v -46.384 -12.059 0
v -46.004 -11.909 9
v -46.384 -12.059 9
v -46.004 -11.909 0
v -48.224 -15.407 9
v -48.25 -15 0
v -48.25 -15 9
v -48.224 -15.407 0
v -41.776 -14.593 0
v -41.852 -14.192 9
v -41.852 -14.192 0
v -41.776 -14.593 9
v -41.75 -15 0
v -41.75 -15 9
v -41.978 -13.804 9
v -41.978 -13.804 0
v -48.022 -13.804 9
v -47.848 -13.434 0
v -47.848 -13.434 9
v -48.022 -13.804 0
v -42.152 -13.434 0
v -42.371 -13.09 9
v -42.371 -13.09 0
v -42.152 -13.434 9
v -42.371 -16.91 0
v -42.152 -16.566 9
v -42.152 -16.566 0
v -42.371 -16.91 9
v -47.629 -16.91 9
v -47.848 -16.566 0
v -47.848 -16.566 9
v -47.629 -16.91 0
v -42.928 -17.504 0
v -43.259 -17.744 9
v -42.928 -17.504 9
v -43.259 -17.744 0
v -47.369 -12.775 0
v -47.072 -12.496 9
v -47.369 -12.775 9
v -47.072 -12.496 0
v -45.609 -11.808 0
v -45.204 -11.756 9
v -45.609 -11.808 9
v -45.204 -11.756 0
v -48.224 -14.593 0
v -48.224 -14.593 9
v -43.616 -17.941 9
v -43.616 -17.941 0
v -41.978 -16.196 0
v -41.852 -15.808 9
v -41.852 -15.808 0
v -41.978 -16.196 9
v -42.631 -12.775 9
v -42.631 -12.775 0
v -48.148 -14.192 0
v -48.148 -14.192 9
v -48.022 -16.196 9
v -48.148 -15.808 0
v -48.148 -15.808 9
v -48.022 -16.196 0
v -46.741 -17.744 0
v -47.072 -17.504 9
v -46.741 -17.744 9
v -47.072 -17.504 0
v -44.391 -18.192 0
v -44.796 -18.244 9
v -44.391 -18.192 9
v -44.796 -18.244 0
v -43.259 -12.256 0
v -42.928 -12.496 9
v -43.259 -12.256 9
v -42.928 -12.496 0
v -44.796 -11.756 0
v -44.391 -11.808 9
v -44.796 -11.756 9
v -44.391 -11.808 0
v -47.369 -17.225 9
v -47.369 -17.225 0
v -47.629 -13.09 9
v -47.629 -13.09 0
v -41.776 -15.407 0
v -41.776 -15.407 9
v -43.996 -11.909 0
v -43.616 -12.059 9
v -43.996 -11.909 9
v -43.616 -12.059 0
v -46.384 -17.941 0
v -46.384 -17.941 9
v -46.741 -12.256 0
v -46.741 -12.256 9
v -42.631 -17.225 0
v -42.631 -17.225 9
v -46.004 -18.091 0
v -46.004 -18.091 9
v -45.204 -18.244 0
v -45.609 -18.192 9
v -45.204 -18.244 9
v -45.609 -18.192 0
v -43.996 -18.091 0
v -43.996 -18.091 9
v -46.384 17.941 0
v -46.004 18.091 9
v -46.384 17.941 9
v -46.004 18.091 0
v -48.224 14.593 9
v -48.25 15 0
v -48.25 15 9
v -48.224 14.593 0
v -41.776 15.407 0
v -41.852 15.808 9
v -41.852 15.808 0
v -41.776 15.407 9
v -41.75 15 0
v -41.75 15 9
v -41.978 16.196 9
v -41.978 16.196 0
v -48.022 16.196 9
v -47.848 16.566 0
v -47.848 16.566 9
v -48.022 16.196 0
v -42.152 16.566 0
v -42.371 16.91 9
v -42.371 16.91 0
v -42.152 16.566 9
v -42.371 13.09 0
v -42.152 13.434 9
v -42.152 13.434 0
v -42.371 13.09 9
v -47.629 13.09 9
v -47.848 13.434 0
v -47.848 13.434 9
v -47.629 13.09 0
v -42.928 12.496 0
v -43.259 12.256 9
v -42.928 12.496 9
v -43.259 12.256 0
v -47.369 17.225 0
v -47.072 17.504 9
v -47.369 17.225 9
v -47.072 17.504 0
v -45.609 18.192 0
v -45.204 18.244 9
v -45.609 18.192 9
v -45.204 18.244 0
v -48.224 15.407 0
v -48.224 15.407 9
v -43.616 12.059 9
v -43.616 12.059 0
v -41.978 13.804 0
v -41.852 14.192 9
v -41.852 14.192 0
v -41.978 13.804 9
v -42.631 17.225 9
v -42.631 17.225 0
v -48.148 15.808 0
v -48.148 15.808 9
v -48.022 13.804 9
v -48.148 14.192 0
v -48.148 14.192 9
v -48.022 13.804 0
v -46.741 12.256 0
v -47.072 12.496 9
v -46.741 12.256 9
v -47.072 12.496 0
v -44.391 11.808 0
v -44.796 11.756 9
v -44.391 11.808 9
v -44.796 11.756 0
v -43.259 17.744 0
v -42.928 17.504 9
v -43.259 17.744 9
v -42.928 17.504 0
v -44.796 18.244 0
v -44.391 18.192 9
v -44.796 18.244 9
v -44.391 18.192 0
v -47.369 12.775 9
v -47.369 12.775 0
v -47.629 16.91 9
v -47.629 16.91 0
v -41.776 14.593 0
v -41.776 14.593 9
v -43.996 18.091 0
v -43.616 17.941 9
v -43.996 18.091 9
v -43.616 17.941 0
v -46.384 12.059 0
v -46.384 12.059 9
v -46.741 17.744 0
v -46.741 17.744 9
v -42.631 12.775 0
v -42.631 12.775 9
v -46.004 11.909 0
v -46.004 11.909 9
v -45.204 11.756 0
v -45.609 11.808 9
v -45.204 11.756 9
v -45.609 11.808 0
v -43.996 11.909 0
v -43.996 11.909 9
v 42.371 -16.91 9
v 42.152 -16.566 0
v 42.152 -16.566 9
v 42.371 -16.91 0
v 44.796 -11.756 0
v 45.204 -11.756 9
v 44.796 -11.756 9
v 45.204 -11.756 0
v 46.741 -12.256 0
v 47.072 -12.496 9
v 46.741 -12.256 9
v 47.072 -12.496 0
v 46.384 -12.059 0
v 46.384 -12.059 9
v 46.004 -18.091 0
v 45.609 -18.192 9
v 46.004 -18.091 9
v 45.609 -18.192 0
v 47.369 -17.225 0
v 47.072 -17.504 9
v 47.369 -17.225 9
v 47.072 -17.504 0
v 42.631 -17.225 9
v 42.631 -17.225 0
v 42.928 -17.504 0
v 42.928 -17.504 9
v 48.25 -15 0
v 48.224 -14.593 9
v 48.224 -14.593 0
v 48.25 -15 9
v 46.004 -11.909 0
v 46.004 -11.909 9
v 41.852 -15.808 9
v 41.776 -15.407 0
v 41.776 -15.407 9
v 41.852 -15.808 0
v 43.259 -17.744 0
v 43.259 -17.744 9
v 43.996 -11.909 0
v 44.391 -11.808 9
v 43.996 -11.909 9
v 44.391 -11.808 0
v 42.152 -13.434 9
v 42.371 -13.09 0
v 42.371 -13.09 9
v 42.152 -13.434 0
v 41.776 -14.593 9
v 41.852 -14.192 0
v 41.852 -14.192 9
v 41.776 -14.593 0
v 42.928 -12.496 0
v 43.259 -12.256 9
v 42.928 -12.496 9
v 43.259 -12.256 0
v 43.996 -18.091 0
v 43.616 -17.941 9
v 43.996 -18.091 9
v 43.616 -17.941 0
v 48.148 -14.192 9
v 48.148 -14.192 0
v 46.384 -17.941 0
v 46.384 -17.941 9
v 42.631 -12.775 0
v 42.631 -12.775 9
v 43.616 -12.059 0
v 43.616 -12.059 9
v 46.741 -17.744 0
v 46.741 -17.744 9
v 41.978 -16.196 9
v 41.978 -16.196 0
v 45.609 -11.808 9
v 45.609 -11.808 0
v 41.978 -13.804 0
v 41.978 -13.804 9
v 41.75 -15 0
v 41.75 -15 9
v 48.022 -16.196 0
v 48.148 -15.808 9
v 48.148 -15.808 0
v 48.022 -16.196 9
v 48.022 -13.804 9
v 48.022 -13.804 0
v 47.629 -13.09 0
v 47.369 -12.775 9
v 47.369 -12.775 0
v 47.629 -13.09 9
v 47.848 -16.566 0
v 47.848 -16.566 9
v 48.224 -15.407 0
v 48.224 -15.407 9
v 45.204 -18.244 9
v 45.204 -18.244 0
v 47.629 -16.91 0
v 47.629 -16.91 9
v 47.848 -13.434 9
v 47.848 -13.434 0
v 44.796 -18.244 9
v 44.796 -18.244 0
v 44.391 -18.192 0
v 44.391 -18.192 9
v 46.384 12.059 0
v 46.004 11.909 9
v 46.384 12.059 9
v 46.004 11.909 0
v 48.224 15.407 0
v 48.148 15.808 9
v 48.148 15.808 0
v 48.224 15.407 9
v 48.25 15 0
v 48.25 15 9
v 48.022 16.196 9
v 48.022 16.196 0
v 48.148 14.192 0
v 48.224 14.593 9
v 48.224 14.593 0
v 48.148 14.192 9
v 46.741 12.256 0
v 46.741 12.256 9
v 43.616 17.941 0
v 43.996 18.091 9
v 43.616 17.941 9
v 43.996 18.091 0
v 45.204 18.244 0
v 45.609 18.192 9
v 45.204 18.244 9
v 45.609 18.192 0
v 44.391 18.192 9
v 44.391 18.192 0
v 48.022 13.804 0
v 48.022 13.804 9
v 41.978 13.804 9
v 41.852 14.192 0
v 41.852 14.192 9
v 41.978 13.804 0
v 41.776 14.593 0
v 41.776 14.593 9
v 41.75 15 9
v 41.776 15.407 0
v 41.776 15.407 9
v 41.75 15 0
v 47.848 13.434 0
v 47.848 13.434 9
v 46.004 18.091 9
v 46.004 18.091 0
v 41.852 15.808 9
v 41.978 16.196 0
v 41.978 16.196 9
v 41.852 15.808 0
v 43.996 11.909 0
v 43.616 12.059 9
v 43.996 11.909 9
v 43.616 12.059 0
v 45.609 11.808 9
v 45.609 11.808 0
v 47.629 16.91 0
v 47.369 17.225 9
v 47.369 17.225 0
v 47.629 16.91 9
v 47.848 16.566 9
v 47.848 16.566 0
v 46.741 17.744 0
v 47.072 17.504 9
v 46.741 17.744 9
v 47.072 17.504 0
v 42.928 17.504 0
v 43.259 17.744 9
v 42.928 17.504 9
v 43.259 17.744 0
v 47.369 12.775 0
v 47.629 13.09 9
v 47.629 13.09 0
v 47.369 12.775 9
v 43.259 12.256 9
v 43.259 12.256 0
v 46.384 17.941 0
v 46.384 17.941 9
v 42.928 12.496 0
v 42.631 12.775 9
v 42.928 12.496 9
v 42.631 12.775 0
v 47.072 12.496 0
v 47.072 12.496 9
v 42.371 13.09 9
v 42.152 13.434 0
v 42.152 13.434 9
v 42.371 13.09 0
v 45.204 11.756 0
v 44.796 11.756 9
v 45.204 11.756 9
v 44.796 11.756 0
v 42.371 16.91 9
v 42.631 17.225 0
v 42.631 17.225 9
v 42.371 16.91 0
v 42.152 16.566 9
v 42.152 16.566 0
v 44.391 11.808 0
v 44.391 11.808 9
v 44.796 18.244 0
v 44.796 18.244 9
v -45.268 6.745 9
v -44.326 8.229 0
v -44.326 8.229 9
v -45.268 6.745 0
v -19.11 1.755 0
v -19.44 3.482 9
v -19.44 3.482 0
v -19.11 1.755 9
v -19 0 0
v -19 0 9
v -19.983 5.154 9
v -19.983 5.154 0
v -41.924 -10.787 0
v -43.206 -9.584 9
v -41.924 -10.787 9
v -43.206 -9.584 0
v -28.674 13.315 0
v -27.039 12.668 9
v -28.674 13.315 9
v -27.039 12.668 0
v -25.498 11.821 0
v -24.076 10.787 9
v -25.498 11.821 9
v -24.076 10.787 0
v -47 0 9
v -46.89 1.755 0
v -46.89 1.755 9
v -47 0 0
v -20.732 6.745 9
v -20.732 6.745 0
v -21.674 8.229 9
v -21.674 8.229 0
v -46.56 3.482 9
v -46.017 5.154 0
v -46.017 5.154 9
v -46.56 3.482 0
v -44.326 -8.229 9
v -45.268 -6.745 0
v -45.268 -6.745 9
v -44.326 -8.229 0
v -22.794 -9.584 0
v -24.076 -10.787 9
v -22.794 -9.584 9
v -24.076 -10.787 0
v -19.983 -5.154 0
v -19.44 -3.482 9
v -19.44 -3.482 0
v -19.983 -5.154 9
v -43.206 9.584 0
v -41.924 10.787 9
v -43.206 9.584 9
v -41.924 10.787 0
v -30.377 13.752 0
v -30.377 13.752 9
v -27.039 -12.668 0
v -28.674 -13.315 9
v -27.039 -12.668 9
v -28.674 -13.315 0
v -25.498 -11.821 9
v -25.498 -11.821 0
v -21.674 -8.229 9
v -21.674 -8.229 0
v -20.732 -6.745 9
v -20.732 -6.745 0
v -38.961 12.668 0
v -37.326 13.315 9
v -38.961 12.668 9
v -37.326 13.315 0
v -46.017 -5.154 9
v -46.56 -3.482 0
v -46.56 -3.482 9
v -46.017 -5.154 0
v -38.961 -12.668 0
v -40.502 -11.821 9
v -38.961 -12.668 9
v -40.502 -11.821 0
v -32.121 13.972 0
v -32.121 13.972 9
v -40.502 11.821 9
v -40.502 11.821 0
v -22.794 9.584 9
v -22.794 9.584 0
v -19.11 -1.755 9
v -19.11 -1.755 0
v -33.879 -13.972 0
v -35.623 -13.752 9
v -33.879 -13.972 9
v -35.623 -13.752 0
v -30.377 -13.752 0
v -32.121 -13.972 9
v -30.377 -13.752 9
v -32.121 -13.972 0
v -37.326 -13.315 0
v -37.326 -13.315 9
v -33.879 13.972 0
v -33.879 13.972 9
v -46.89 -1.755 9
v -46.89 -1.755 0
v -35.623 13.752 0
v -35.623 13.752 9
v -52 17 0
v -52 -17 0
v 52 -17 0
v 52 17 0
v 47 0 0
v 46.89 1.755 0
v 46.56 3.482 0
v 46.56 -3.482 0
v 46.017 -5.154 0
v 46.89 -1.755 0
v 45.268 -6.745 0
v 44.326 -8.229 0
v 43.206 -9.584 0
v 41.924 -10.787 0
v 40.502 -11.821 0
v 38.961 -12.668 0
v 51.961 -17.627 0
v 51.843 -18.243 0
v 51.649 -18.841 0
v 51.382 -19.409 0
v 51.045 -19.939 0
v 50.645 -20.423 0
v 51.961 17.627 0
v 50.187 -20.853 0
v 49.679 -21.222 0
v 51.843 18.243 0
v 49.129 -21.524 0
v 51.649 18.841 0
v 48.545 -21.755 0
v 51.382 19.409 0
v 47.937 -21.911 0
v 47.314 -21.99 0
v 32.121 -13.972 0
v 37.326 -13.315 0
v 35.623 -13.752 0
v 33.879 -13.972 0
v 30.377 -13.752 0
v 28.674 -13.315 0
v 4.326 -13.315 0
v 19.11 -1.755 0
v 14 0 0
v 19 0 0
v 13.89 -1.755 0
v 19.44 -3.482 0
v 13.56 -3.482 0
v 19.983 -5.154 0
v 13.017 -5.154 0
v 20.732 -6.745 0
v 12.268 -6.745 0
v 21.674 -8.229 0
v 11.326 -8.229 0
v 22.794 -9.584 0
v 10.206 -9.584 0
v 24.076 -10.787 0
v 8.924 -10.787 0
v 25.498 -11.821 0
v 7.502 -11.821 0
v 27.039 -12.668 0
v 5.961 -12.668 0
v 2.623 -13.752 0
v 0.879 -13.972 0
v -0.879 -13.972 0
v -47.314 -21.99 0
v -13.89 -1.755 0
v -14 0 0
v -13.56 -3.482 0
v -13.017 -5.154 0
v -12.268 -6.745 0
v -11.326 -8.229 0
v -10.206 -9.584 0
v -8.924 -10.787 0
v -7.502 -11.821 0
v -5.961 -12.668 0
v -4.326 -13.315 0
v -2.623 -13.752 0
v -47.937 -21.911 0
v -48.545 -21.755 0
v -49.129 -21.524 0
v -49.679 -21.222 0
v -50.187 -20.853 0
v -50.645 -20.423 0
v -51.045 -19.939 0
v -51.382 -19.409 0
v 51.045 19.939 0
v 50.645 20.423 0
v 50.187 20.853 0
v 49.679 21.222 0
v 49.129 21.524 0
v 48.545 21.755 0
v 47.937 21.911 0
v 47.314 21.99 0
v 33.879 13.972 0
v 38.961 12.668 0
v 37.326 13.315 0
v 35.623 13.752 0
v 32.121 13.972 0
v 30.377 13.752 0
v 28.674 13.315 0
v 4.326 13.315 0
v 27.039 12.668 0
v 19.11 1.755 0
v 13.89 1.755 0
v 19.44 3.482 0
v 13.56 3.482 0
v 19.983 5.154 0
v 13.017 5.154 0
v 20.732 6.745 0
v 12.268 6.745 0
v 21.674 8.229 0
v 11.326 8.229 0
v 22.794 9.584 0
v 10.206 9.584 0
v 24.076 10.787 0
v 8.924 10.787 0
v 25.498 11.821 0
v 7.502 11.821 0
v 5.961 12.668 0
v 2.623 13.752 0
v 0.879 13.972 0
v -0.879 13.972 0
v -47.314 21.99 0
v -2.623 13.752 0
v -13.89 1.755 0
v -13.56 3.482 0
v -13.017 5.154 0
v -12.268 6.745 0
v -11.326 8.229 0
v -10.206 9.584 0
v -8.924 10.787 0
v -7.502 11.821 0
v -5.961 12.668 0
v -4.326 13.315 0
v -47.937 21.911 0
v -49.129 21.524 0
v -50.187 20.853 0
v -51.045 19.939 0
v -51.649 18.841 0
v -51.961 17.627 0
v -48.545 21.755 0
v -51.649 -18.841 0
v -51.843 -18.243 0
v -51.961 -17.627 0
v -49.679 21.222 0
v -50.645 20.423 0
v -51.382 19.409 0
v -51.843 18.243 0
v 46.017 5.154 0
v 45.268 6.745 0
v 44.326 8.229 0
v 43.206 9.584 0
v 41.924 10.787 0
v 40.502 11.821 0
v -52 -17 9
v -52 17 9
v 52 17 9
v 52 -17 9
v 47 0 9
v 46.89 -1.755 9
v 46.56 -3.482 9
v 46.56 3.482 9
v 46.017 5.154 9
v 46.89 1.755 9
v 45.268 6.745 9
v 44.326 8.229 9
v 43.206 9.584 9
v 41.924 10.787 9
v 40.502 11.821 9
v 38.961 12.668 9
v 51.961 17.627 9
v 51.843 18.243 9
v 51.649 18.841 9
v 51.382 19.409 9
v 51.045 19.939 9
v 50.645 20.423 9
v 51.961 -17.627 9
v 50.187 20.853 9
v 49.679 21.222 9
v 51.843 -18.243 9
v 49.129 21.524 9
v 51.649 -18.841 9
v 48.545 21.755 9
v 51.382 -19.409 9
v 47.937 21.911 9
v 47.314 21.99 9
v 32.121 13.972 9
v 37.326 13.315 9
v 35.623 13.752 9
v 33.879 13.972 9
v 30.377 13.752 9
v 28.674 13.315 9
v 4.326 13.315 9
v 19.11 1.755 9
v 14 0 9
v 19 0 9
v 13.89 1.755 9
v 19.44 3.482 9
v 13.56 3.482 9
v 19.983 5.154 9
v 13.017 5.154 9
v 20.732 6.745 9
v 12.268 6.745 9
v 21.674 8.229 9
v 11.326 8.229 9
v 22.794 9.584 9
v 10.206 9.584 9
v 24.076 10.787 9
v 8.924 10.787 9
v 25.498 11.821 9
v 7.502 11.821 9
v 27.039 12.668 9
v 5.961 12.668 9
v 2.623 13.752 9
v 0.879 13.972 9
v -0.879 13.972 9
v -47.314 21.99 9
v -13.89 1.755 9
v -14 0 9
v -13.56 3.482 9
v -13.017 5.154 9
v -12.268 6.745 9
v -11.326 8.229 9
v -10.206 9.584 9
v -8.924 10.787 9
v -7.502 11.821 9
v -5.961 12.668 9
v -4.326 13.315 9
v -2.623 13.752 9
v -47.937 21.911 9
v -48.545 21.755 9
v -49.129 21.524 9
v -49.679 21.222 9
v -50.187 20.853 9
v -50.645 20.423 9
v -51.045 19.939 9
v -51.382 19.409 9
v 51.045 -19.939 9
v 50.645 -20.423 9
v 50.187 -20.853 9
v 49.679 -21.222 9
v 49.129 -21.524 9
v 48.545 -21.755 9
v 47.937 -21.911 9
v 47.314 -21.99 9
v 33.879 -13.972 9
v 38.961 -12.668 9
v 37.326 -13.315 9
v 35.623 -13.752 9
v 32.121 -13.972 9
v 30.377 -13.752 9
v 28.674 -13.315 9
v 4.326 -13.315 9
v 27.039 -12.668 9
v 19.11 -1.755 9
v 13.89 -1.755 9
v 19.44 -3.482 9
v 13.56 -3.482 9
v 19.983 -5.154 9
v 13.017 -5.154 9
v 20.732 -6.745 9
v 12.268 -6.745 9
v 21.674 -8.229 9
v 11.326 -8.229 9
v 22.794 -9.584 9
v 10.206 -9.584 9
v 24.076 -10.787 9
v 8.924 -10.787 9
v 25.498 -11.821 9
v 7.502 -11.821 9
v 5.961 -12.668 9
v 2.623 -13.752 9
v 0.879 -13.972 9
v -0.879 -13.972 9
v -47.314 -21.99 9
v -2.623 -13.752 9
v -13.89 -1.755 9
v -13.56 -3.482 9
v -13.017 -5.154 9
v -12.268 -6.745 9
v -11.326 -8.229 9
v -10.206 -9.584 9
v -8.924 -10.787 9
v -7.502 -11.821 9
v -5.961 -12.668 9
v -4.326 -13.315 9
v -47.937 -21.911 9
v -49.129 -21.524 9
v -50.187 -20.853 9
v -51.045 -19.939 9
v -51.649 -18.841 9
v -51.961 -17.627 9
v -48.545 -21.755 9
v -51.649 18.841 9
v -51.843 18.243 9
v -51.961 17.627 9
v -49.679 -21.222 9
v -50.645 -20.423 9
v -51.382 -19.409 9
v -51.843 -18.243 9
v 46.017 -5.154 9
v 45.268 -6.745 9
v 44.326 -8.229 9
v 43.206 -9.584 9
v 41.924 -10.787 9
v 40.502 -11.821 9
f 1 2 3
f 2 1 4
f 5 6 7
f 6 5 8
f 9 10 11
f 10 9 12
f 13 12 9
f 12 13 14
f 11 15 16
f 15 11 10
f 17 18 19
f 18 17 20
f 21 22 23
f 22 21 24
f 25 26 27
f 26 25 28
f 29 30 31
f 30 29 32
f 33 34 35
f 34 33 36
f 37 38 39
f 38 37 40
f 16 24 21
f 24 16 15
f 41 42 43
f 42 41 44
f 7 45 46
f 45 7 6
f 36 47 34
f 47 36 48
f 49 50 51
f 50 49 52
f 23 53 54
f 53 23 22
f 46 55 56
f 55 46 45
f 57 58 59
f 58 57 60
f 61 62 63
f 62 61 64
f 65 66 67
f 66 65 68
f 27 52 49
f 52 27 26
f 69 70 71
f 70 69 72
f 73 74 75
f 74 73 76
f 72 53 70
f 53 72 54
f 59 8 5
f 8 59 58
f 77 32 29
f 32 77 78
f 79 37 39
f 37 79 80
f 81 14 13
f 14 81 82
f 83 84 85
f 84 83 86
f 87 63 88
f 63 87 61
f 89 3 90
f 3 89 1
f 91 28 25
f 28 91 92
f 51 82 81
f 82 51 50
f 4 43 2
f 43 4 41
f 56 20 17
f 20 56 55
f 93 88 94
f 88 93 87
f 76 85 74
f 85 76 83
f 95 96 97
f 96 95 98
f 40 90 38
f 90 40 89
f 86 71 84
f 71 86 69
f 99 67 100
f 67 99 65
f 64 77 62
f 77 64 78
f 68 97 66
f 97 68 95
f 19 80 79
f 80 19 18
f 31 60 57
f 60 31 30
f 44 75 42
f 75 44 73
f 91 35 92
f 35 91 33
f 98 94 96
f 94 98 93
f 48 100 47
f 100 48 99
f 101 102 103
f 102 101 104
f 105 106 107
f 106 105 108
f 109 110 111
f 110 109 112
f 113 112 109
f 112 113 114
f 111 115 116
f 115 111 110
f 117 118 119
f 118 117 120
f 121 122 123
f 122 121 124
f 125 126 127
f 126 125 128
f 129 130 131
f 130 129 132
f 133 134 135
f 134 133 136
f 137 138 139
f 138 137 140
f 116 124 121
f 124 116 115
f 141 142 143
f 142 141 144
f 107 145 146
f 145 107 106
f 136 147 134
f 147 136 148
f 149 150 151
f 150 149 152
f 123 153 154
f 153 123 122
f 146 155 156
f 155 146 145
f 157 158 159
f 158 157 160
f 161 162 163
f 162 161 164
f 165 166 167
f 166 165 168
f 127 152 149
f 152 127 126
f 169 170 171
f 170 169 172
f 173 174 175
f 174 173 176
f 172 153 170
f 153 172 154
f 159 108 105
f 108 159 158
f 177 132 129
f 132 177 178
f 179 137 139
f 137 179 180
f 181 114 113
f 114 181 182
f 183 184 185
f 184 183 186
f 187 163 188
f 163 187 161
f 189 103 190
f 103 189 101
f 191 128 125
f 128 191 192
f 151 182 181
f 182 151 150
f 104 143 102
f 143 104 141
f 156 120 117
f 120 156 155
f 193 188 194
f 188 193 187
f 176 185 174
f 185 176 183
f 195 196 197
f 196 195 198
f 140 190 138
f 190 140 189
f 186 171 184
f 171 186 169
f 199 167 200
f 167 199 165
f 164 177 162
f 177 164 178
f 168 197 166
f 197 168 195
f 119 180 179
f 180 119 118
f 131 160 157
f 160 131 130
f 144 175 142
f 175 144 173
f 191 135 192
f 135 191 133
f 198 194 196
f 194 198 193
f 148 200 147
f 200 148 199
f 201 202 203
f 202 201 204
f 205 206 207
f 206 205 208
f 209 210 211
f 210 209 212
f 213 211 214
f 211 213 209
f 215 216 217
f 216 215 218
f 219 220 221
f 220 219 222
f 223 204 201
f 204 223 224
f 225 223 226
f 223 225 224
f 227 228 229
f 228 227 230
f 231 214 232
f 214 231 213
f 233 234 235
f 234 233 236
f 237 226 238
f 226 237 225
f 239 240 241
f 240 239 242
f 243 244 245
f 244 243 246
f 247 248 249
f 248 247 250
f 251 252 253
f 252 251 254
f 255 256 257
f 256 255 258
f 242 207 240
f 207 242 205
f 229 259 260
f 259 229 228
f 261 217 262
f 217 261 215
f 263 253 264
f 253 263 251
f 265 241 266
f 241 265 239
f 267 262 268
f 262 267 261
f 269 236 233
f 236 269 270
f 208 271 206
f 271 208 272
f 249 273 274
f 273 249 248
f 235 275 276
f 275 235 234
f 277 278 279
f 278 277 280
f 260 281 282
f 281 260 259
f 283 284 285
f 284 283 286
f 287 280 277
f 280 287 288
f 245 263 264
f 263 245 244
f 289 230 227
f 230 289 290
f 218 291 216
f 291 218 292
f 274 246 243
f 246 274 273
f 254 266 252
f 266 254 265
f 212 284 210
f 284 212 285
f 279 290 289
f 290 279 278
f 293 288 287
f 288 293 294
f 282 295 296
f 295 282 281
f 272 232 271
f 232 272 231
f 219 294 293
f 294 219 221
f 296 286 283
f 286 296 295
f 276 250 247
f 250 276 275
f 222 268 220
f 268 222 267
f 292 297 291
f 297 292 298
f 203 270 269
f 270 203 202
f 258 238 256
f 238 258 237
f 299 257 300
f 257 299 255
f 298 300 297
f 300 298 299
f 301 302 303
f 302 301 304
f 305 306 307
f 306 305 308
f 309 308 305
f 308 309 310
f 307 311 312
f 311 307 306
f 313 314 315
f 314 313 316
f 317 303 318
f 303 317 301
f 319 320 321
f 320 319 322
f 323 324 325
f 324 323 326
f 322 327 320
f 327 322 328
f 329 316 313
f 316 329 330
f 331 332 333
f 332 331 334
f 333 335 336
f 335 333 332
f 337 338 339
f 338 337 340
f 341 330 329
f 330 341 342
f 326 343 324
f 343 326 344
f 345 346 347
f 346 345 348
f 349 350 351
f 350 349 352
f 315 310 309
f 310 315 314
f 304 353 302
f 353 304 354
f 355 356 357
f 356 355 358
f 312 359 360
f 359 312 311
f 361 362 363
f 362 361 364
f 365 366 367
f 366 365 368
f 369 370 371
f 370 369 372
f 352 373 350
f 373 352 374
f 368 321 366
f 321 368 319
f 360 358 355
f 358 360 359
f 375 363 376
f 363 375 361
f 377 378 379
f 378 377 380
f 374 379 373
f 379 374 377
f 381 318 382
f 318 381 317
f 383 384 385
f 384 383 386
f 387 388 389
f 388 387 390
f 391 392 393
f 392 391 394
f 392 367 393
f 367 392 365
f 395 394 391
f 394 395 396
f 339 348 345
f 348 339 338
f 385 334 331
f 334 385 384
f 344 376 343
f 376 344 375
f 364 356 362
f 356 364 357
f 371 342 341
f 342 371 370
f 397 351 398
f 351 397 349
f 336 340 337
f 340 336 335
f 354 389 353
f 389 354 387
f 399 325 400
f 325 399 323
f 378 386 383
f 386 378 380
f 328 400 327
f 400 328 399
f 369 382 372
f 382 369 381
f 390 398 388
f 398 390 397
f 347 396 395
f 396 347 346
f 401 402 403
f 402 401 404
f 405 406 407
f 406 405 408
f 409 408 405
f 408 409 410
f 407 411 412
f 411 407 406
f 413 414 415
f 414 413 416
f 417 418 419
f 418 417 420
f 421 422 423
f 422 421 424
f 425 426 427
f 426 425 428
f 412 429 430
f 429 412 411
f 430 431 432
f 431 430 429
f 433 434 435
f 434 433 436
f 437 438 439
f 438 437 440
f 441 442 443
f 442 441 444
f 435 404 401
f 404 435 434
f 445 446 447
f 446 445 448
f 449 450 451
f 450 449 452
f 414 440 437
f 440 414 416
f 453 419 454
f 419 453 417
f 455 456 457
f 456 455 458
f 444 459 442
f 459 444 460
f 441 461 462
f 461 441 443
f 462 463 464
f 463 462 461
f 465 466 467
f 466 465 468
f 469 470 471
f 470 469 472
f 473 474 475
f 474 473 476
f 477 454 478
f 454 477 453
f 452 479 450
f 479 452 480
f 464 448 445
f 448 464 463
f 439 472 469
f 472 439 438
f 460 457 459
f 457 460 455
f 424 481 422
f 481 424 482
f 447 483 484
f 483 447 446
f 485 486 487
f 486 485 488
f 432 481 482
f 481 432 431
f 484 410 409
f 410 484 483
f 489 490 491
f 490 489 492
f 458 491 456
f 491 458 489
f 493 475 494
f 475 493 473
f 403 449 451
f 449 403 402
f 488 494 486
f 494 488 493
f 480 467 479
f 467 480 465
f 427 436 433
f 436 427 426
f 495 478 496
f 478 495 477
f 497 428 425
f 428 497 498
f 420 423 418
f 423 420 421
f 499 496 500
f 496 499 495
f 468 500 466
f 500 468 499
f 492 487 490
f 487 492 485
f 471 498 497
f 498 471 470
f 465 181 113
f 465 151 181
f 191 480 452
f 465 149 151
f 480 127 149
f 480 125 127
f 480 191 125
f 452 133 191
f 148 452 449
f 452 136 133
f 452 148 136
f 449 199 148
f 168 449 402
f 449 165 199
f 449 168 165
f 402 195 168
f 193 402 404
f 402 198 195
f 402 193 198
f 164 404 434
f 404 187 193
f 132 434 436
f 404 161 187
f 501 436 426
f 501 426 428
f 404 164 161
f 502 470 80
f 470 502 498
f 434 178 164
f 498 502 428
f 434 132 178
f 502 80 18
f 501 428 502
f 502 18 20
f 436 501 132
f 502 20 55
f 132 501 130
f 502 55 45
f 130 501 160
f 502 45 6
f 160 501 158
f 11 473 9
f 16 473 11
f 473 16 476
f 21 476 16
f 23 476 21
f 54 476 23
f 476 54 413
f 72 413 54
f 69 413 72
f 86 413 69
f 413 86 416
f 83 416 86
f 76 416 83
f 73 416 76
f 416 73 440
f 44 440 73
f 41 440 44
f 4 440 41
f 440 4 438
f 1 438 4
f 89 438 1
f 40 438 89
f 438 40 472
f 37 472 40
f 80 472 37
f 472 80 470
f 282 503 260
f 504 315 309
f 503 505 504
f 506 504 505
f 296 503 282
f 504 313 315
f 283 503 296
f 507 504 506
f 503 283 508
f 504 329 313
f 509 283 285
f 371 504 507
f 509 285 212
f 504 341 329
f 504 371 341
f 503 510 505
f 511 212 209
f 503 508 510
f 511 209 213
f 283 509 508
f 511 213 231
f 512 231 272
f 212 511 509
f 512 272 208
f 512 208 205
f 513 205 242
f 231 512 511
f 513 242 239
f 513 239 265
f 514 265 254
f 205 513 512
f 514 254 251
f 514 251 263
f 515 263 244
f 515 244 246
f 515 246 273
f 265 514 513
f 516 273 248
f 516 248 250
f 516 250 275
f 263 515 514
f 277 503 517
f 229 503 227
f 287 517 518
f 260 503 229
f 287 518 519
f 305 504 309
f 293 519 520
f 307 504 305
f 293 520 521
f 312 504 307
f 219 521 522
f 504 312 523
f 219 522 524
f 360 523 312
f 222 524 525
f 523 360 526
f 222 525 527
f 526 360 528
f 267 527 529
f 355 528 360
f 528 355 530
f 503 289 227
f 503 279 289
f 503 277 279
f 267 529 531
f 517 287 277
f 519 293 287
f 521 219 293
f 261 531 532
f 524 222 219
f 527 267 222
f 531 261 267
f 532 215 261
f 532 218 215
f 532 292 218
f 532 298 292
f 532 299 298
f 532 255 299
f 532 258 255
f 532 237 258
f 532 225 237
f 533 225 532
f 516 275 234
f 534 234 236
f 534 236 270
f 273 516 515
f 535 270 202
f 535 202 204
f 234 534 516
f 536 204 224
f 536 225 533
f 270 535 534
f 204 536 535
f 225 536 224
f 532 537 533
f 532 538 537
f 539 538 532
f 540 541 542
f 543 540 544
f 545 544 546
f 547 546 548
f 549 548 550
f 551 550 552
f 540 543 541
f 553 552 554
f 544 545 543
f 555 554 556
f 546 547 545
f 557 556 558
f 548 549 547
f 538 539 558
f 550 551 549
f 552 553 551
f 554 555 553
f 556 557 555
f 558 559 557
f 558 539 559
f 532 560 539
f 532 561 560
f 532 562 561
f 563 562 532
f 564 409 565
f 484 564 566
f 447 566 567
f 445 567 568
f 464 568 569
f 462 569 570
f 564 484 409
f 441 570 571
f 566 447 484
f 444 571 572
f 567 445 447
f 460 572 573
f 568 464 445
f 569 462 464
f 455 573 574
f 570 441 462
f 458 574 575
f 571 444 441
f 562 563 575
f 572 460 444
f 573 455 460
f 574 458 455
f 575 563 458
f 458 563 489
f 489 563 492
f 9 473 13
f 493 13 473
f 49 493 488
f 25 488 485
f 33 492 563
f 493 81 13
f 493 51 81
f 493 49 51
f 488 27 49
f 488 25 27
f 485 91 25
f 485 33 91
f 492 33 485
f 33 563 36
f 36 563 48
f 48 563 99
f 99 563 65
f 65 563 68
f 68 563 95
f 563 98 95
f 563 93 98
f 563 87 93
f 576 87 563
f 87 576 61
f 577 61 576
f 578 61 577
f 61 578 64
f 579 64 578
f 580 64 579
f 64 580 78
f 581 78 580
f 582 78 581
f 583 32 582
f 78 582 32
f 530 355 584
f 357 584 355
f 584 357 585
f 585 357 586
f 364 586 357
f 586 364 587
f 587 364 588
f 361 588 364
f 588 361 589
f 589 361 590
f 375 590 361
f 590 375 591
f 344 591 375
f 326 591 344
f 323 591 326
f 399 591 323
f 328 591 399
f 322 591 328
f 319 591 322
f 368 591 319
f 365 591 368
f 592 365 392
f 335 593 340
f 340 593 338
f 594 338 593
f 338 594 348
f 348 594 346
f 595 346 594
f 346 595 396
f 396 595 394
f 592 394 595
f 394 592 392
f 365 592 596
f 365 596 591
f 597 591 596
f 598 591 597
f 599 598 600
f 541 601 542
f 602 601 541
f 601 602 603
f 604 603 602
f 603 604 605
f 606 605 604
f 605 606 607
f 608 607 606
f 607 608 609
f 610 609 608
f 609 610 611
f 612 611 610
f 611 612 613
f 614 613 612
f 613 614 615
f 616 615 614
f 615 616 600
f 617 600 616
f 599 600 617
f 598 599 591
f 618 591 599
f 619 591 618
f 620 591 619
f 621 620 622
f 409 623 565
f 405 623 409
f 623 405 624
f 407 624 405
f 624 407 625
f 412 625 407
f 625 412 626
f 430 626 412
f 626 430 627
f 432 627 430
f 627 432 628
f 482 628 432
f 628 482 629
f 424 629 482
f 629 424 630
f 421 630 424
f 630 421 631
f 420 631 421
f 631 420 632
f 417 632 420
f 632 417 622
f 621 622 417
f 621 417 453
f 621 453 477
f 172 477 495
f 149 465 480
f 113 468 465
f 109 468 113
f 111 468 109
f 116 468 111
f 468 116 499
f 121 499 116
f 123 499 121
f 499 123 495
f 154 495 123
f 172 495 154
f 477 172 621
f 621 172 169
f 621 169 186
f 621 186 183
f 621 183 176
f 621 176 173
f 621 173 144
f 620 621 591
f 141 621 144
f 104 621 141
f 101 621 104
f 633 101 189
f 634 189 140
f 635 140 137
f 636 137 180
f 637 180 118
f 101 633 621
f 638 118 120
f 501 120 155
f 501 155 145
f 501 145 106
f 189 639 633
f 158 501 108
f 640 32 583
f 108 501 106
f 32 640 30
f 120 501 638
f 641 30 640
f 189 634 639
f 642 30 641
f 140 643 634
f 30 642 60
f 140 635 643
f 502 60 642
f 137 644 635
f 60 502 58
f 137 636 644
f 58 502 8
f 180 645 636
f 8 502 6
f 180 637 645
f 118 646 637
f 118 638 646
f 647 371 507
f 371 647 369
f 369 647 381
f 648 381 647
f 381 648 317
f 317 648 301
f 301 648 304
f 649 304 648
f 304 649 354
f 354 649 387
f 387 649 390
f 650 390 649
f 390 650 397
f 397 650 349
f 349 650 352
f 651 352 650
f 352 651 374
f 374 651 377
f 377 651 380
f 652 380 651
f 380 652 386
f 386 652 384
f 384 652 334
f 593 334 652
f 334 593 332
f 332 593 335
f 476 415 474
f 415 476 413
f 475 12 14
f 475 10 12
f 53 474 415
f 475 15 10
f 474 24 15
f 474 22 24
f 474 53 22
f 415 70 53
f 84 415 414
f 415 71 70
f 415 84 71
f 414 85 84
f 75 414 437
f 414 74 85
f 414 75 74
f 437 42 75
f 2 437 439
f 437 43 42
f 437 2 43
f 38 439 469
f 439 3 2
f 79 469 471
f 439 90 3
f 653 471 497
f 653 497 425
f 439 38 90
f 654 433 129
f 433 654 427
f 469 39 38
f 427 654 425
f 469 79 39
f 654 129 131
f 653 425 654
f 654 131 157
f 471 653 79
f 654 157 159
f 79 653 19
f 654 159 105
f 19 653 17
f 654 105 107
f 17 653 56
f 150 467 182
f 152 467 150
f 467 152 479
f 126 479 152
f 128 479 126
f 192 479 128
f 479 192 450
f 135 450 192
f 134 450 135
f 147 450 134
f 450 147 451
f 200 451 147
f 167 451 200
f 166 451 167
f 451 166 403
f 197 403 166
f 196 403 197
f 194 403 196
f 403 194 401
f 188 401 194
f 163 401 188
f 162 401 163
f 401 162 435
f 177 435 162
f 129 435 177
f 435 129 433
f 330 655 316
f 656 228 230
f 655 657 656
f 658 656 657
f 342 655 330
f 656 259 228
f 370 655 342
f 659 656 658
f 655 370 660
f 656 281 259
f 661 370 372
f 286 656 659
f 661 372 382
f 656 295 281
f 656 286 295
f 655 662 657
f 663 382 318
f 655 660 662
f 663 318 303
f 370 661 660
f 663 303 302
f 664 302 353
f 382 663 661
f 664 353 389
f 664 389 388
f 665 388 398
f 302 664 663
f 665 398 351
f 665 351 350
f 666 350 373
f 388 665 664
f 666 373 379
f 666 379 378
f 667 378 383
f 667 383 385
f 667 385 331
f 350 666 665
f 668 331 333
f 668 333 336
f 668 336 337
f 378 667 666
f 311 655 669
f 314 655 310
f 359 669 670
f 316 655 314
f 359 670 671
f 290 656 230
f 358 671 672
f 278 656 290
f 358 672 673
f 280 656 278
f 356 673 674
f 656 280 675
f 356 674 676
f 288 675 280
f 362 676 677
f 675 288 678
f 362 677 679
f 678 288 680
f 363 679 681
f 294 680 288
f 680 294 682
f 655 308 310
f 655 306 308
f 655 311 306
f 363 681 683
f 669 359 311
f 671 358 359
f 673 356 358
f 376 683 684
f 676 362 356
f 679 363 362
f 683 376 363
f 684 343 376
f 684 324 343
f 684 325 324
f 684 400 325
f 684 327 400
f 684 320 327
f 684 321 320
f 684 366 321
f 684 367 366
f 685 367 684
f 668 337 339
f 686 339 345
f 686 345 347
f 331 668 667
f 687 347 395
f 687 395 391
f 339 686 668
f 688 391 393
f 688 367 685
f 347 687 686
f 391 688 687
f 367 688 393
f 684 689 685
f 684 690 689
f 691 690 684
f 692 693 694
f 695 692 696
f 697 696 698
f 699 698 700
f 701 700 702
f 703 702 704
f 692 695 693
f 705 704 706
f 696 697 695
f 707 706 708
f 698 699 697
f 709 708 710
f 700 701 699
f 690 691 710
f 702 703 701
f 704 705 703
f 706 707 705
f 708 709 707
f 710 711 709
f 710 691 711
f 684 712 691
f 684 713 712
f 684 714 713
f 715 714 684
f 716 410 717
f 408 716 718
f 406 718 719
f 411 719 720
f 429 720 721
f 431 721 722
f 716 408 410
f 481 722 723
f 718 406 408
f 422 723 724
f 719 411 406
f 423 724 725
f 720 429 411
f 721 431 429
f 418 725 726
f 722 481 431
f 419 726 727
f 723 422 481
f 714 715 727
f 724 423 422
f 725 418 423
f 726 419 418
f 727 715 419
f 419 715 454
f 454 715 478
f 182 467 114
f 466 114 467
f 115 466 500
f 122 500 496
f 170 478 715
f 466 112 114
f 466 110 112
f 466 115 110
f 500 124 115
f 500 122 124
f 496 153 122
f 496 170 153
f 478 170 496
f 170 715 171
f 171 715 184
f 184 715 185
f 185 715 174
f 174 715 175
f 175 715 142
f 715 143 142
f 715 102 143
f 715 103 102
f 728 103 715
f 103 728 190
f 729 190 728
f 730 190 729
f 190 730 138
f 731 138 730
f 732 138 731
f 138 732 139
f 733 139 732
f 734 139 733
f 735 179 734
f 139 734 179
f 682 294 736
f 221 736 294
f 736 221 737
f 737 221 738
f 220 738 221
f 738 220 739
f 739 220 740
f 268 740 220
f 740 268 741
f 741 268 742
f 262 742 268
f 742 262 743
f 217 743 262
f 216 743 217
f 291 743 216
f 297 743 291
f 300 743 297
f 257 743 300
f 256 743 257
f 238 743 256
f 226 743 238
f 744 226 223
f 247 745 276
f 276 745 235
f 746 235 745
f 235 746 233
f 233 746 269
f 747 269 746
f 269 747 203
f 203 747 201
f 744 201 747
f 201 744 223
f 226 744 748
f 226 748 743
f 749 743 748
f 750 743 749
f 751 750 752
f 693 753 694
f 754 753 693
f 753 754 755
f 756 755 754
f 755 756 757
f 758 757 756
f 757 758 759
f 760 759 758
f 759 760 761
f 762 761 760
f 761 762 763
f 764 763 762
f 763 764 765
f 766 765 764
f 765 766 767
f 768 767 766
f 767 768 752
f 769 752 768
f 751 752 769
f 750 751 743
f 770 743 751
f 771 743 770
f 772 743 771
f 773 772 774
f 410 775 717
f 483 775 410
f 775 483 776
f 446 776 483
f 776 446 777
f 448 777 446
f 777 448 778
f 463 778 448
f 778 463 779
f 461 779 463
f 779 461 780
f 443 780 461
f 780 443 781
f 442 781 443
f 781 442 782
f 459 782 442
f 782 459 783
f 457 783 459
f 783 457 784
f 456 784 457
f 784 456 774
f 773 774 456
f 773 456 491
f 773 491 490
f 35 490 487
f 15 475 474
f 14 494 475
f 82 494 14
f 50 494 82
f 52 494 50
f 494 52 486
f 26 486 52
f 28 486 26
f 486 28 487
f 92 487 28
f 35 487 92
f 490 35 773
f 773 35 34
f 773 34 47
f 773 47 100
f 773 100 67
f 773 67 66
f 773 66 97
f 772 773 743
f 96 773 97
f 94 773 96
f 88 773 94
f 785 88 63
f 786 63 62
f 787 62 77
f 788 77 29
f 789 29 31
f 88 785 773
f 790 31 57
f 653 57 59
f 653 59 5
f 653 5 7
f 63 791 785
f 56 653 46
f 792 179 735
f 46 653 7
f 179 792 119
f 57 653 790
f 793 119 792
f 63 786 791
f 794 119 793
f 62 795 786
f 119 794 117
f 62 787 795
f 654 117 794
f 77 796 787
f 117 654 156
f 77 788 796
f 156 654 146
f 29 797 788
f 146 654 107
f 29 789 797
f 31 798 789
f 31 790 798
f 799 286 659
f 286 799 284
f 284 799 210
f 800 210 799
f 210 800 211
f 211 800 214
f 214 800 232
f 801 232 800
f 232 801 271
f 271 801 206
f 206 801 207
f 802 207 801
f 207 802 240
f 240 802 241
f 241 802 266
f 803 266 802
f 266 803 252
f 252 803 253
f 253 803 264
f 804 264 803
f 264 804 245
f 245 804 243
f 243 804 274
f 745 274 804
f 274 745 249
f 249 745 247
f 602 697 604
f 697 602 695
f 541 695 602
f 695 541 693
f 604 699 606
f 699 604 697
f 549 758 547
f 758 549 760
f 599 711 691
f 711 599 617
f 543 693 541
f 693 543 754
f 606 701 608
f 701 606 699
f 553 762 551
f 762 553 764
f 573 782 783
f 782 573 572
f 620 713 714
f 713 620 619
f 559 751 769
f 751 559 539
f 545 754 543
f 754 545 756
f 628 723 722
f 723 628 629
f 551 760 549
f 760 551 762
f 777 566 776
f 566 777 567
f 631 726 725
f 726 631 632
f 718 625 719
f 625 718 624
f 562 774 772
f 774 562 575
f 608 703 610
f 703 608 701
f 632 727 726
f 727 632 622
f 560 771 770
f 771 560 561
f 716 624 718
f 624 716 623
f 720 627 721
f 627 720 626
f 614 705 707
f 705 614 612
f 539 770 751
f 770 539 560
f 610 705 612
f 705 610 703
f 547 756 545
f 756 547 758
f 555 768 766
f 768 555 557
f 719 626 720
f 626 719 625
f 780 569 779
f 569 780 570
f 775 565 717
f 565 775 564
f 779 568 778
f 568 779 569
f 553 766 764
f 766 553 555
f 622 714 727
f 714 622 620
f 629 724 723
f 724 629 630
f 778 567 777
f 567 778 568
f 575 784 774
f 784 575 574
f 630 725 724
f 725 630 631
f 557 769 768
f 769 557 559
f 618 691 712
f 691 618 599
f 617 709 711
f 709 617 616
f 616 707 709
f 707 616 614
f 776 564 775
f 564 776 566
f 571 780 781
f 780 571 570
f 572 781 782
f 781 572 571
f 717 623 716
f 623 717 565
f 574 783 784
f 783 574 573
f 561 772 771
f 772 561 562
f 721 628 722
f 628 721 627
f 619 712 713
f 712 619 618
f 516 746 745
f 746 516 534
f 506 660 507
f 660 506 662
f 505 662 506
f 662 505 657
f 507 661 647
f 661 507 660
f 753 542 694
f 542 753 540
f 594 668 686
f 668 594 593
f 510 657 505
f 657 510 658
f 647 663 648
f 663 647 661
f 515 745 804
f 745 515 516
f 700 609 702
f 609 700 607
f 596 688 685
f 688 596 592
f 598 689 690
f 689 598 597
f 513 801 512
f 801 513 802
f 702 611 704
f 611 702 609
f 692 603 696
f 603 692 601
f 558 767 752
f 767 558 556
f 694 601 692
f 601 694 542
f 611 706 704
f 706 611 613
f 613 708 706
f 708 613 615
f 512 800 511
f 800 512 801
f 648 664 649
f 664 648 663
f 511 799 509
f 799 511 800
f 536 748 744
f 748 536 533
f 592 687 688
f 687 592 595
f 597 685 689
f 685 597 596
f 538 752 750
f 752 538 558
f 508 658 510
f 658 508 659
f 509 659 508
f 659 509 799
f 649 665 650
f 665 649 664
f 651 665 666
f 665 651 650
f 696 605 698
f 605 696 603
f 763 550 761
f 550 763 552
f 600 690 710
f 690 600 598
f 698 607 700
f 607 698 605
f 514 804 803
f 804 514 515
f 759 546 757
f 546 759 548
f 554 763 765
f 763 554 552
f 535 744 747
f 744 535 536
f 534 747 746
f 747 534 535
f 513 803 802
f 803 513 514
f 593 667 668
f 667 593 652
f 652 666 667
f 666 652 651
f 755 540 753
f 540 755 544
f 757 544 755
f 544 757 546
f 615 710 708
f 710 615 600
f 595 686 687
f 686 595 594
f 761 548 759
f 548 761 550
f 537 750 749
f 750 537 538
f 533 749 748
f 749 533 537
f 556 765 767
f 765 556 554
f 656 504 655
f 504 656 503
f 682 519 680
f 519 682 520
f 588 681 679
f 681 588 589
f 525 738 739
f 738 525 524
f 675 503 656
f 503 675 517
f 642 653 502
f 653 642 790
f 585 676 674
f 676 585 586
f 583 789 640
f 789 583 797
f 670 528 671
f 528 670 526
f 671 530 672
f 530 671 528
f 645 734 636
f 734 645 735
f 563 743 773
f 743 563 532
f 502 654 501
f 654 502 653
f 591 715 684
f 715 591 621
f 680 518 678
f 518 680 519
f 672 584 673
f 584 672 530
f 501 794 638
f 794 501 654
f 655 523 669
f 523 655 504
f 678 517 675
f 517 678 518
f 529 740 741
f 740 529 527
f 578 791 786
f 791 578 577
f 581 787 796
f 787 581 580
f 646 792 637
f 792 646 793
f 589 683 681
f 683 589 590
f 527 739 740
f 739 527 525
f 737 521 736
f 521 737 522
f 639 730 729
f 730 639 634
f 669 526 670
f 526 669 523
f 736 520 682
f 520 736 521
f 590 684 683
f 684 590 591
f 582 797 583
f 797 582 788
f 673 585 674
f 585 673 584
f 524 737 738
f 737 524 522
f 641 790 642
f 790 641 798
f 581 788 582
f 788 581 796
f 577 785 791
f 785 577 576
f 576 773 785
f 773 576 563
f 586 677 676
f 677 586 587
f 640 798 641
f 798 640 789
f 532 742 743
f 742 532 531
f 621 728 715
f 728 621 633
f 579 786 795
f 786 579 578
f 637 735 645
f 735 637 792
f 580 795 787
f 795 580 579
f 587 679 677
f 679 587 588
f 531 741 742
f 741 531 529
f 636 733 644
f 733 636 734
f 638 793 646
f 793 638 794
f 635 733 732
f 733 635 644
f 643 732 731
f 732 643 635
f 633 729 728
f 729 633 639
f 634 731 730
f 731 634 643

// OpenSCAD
$fn = 50;


difference() {
	union() {
		hull() {
			translate(v = [-47.0000000000, 17.0000000000, 0]) {
				cylinder(h = 9, r = 5);
			}
			translate(v = [47.0000000000, 17.0000000000, 0]) {
				cylinder(h = 9, r = 5);
			}
			translate(v = [-47.0000000000, -17.0000000000, 0]) {
				cylinder(h = 9, r = 5);
			}
			translate(v = [47.0000000000, -17.0000000000, 0]) {
				cylinder(h = 9, r = 5);
			}
		}
	}
	union() {
		#translate(v = [-45.0000000000, -15.0000000000, -100.0000000000]) {
			cylinder(h = 200, r = 3.2500000000);
		}
		#translate(v = [-45.0000000000, 15.0000000000, -100.0000000000]) {
			cylinder(h = 200, r = 3.2500000000);
		}
		#translate(v = [45.0000000000, -15.0000000000, -100.0000000000]) {
			cylinder(h = 200, r = 3.2500000000);
		}
		#translate(v = [45.0000000000, 15.0000000000, -100.0000000000]) {
			cylinder(h = 200, r = 3.2500000000);
		}
		#translate(v = [-33.0000000000, 0, 0]) {
			cylinder(h = 9, r = 14.0000000000);
		}
		#cylinder(h = 9, r = 14.0000000000);
		#translate(v = [33.0000000000, 0, 0]) {
			cylinder(h = 9, r = 14.0000000000);
		}
	}
}
